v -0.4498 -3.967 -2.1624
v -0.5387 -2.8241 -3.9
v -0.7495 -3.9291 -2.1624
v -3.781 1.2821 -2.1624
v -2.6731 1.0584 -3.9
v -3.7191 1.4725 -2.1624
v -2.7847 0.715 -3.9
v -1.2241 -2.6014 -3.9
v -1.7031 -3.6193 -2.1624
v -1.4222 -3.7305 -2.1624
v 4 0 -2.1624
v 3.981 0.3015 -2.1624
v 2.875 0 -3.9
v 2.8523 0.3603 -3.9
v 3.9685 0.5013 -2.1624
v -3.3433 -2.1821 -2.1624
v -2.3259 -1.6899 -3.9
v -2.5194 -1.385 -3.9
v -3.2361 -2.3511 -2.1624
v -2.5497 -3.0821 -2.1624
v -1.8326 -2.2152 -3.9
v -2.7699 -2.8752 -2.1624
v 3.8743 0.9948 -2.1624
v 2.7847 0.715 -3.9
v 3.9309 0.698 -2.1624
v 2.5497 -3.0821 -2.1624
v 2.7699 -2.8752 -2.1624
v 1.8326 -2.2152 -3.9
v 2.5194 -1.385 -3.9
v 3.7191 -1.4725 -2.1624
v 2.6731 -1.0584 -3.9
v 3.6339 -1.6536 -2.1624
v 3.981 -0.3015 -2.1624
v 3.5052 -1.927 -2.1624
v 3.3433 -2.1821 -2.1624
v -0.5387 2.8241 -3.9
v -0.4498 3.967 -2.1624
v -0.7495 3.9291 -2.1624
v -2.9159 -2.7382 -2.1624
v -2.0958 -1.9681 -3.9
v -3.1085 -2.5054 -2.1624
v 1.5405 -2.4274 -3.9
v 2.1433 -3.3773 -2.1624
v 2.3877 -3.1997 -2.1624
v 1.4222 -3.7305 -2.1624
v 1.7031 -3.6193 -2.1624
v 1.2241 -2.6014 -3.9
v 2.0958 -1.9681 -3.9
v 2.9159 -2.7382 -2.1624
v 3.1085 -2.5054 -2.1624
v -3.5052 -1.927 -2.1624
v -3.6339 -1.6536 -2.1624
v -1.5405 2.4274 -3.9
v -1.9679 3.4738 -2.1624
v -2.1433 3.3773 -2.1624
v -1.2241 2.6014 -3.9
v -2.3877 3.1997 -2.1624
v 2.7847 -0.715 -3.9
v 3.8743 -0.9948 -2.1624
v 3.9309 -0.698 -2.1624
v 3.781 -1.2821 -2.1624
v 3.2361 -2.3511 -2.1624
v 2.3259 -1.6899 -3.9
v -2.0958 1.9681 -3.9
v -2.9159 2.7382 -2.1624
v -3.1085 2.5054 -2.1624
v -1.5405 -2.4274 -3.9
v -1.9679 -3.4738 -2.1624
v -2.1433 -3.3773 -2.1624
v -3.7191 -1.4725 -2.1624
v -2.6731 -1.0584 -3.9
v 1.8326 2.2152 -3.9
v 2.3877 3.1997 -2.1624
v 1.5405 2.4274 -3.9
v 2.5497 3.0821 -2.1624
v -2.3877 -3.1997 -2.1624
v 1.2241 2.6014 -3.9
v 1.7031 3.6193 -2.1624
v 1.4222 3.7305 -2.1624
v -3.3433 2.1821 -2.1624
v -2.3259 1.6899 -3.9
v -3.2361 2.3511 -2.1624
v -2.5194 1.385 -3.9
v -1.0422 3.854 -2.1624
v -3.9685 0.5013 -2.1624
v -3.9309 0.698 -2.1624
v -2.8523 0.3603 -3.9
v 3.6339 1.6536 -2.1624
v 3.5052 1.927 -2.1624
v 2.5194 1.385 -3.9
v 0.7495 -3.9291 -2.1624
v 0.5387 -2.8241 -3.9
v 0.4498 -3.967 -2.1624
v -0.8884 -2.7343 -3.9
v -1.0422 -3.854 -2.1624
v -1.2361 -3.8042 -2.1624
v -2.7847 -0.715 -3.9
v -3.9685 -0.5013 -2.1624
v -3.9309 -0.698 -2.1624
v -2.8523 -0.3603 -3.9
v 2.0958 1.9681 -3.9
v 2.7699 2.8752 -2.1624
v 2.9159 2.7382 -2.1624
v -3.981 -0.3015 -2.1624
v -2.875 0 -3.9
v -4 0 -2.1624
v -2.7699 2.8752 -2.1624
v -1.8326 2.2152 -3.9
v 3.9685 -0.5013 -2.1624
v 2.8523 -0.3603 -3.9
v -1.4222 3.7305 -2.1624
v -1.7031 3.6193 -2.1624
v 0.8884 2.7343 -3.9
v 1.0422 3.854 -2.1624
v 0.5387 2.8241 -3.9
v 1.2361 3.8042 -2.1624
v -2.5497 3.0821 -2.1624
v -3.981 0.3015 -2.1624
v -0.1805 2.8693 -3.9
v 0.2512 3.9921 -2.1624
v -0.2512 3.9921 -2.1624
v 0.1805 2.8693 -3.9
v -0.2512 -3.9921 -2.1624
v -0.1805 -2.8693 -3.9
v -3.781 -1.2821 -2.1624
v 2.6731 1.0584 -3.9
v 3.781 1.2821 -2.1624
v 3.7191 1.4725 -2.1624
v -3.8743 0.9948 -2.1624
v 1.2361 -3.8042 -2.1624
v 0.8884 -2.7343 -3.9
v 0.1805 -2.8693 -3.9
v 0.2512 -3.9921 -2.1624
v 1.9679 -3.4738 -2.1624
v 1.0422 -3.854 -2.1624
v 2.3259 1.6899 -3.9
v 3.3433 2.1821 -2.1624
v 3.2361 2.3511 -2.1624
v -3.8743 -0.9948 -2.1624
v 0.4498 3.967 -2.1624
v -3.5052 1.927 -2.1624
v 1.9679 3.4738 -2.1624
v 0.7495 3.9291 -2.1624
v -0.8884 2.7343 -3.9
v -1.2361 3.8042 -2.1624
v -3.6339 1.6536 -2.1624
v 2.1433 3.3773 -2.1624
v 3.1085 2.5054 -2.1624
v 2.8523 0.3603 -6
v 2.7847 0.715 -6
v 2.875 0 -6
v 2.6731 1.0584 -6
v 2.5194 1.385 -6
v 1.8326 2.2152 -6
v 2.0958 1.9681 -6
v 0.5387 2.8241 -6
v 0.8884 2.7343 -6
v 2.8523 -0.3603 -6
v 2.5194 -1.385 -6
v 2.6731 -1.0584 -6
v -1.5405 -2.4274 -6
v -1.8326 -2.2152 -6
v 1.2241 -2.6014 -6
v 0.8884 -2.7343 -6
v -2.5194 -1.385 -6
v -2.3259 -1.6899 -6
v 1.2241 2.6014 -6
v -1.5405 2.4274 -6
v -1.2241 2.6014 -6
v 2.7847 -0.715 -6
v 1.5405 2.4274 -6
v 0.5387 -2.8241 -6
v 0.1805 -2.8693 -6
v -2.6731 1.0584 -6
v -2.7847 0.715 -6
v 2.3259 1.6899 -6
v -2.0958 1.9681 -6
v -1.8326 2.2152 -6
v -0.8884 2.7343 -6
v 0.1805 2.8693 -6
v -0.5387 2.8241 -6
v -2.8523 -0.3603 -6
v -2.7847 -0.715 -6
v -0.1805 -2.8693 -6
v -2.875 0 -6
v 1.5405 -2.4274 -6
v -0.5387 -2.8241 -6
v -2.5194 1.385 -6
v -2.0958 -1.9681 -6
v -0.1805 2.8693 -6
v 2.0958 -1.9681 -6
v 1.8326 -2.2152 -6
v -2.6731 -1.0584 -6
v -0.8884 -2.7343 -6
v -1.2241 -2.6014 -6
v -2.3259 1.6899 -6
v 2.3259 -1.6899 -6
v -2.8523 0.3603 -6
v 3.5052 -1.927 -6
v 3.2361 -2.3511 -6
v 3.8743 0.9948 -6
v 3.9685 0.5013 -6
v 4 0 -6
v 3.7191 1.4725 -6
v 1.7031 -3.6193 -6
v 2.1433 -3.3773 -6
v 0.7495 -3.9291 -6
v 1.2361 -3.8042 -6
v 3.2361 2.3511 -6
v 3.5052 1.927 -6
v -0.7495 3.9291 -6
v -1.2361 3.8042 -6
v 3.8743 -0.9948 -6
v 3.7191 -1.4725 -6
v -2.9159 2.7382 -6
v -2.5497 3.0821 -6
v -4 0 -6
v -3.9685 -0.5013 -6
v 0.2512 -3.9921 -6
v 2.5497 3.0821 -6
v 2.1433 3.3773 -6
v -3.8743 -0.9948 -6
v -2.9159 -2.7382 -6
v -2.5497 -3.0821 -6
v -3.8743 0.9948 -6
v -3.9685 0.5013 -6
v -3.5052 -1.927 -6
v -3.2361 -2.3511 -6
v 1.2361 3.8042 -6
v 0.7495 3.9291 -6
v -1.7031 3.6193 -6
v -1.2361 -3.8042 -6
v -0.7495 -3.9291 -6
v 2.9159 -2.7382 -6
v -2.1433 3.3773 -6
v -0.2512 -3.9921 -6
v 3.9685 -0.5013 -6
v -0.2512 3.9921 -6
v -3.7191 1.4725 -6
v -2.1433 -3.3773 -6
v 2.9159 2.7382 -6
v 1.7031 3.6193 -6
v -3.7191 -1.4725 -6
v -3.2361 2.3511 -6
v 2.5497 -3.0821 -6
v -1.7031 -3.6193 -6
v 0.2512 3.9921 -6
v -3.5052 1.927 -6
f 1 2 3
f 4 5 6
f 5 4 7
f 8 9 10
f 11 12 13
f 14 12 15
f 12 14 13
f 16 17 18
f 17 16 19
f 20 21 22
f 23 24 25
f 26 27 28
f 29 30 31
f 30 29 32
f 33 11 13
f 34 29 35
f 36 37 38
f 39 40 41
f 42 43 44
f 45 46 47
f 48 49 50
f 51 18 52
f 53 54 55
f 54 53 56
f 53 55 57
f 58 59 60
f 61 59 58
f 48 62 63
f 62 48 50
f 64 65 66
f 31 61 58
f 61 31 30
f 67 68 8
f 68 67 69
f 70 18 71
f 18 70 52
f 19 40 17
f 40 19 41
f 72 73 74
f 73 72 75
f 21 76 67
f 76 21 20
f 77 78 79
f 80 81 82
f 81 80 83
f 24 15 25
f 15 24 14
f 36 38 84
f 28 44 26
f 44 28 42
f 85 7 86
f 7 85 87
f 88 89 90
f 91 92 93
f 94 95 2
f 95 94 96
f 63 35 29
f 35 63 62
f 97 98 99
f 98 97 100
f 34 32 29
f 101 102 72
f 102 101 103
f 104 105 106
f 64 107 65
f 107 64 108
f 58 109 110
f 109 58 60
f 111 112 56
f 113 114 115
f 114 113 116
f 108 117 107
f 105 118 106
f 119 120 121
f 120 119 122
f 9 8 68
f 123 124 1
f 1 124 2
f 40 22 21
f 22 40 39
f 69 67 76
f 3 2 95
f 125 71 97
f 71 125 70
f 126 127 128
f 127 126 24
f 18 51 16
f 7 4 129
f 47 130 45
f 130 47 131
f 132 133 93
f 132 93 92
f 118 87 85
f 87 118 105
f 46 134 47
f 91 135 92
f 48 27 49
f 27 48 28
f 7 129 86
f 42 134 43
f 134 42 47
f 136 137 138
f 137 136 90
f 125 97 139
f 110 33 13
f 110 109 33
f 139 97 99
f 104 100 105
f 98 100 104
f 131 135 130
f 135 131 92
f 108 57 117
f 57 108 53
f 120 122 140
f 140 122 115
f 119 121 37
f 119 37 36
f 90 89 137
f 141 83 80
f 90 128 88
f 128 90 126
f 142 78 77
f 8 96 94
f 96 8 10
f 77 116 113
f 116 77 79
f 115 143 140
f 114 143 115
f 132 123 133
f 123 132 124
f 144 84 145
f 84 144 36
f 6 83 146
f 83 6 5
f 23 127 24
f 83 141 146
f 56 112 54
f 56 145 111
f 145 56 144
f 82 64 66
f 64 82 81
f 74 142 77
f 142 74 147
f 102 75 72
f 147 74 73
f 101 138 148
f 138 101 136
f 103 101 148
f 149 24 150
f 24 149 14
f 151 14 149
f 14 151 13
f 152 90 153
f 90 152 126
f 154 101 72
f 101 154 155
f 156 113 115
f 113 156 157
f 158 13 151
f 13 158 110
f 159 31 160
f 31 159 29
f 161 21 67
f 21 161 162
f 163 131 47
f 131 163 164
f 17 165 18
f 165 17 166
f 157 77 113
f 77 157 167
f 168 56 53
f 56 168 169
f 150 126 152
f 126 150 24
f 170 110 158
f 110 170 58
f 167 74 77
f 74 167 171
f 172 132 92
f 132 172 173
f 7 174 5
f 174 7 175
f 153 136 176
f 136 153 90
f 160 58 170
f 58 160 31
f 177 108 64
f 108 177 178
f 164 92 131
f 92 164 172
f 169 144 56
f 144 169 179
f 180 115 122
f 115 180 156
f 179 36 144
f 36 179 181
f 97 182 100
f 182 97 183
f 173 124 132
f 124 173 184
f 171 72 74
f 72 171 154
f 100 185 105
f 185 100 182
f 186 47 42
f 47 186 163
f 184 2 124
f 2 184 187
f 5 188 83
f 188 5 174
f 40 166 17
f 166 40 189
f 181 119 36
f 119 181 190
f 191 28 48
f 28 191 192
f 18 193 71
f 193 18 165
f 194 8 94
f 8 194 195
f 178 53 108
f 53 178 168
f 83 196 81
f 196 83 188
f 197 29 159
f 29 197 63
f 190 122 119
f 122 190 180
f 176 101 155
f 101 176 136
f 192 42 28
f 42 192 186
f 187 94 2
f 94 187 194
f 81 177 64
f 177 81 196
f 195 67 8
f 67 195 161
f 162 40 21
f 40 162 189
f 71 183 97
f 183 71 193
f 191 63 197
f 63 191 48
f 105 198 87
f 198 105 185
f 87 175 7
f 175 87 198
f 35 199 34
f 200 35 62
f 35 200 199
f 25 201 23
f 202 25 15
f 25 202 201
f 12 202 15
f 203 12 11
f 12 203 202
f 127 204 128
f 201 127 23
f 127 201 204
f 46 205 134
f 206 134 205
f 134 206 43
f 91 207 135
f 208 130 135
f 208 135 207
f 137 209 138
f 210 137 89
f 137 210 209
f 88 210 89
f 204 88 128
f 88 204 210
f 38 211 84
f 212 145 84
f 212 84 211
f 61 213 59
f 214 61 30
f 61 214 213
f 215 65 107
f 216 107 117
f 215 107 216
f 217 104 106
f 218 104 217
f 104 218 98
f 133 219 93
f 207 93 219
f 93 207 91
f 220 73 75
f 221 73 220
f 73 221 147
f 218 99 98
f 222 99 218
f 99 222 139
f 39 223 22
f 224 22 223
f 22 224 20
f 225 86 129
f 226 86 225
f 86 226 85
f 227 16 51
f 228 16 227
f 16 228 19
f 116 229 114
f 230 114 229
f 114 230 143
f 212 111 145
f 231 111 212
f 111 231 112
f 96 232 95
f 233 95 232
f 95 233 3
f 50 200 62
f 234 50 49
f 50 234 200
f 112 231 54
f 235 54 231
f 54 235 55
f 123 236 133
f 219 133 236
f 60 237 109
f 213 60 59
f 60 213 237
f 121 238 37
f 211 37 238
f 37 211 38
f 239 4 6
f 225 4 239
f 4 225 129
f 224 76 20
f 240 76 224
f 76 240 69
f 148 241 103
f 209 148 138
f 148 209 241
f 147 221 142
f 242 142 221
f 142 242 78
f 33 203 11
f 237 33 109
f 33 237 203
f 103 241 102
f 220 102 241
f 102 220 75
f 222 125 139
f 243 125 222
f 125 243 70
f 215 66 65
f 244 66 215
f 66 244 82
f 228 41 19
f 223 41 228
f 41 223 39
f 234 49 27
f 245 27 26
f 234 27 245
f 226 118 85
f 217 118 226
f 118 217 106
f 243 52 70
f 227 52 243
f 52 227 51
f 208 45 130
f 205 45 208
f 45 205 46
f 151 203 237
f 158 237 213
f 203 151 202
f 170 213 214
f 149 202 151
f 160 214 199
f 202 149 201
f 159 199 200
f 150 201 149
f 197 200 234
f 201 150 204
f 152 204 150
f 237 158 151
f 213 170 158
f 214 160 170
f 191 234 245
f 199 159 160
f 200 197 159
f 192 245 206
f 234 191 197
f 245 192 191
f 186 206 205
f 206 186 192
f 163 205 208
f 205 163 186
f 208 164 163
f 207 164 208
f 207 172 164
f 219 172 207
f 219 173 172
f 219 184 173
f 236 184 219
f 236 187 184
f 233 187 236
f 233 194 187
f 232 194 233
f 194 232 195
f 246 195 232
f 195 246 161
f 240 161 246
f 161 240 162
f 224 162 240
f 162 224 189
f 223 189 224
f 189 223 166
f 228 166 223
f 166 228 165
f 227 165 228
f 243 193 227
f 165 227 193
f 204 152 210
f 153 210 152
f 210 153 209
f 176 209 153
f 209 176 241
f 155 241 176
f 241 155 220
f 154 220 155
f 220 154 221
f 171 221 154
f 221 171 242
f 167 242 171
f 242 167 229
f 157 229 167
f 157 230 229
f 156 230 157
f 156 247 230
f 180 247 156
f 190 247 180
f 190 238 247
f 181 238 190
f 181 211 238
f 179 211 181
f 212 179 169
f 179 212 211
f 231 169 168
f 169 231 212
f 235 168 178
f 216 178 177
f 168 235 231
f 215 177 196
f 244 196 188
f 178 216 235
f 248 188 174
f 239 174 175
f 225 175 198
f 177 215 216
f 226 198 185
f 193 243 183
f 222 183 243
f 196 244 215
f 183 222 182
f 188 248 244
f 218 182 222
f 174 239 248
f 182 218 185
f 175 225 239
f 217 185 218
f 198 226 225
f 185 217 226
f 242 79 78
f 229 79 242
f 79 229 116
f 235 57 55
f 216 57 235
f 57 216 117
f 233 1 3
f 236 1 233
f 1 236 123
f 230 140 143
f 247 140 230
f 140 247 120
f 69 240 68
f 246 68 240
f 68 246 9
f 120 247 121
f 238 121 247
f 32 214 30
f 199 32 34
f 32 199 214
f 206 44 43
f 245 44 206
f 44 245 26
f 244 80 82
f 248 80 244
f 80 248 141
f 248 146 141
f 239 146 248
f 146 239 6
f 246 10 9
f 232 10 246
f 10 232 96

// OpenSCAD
$fn = 50;

difference() {
	union() {
		translate(v = [0, 0, -6.0]) {
			cylinder(h = 9, r = 4.0);
		}
	}
	union() {
		translate(v = [0, 0, 0]) {
			rotate(a = [0, 0, 0]) {
				difference() {
					union() {
						translate(v = [0, 0, -9.0]) {
							cylinder(h = 9, r = 2.6);
						}
						translate(v = [0, 0, -3.9]) {
							cylinder(h = 3.9, r1 = 2.875, r2 = 5.4);
						}
						translate(v = [0, 0, -9.0]) {
							cylinder(h = 9, r = 2.875);
						}
						translate(v = [0, 0, -9.0]) {
							cylinder(h = 9, r = 2.6);
						}
					}
					union();
				}
			}
		}
		#cylinder(h = 3, r = 5.0);
	}
}
